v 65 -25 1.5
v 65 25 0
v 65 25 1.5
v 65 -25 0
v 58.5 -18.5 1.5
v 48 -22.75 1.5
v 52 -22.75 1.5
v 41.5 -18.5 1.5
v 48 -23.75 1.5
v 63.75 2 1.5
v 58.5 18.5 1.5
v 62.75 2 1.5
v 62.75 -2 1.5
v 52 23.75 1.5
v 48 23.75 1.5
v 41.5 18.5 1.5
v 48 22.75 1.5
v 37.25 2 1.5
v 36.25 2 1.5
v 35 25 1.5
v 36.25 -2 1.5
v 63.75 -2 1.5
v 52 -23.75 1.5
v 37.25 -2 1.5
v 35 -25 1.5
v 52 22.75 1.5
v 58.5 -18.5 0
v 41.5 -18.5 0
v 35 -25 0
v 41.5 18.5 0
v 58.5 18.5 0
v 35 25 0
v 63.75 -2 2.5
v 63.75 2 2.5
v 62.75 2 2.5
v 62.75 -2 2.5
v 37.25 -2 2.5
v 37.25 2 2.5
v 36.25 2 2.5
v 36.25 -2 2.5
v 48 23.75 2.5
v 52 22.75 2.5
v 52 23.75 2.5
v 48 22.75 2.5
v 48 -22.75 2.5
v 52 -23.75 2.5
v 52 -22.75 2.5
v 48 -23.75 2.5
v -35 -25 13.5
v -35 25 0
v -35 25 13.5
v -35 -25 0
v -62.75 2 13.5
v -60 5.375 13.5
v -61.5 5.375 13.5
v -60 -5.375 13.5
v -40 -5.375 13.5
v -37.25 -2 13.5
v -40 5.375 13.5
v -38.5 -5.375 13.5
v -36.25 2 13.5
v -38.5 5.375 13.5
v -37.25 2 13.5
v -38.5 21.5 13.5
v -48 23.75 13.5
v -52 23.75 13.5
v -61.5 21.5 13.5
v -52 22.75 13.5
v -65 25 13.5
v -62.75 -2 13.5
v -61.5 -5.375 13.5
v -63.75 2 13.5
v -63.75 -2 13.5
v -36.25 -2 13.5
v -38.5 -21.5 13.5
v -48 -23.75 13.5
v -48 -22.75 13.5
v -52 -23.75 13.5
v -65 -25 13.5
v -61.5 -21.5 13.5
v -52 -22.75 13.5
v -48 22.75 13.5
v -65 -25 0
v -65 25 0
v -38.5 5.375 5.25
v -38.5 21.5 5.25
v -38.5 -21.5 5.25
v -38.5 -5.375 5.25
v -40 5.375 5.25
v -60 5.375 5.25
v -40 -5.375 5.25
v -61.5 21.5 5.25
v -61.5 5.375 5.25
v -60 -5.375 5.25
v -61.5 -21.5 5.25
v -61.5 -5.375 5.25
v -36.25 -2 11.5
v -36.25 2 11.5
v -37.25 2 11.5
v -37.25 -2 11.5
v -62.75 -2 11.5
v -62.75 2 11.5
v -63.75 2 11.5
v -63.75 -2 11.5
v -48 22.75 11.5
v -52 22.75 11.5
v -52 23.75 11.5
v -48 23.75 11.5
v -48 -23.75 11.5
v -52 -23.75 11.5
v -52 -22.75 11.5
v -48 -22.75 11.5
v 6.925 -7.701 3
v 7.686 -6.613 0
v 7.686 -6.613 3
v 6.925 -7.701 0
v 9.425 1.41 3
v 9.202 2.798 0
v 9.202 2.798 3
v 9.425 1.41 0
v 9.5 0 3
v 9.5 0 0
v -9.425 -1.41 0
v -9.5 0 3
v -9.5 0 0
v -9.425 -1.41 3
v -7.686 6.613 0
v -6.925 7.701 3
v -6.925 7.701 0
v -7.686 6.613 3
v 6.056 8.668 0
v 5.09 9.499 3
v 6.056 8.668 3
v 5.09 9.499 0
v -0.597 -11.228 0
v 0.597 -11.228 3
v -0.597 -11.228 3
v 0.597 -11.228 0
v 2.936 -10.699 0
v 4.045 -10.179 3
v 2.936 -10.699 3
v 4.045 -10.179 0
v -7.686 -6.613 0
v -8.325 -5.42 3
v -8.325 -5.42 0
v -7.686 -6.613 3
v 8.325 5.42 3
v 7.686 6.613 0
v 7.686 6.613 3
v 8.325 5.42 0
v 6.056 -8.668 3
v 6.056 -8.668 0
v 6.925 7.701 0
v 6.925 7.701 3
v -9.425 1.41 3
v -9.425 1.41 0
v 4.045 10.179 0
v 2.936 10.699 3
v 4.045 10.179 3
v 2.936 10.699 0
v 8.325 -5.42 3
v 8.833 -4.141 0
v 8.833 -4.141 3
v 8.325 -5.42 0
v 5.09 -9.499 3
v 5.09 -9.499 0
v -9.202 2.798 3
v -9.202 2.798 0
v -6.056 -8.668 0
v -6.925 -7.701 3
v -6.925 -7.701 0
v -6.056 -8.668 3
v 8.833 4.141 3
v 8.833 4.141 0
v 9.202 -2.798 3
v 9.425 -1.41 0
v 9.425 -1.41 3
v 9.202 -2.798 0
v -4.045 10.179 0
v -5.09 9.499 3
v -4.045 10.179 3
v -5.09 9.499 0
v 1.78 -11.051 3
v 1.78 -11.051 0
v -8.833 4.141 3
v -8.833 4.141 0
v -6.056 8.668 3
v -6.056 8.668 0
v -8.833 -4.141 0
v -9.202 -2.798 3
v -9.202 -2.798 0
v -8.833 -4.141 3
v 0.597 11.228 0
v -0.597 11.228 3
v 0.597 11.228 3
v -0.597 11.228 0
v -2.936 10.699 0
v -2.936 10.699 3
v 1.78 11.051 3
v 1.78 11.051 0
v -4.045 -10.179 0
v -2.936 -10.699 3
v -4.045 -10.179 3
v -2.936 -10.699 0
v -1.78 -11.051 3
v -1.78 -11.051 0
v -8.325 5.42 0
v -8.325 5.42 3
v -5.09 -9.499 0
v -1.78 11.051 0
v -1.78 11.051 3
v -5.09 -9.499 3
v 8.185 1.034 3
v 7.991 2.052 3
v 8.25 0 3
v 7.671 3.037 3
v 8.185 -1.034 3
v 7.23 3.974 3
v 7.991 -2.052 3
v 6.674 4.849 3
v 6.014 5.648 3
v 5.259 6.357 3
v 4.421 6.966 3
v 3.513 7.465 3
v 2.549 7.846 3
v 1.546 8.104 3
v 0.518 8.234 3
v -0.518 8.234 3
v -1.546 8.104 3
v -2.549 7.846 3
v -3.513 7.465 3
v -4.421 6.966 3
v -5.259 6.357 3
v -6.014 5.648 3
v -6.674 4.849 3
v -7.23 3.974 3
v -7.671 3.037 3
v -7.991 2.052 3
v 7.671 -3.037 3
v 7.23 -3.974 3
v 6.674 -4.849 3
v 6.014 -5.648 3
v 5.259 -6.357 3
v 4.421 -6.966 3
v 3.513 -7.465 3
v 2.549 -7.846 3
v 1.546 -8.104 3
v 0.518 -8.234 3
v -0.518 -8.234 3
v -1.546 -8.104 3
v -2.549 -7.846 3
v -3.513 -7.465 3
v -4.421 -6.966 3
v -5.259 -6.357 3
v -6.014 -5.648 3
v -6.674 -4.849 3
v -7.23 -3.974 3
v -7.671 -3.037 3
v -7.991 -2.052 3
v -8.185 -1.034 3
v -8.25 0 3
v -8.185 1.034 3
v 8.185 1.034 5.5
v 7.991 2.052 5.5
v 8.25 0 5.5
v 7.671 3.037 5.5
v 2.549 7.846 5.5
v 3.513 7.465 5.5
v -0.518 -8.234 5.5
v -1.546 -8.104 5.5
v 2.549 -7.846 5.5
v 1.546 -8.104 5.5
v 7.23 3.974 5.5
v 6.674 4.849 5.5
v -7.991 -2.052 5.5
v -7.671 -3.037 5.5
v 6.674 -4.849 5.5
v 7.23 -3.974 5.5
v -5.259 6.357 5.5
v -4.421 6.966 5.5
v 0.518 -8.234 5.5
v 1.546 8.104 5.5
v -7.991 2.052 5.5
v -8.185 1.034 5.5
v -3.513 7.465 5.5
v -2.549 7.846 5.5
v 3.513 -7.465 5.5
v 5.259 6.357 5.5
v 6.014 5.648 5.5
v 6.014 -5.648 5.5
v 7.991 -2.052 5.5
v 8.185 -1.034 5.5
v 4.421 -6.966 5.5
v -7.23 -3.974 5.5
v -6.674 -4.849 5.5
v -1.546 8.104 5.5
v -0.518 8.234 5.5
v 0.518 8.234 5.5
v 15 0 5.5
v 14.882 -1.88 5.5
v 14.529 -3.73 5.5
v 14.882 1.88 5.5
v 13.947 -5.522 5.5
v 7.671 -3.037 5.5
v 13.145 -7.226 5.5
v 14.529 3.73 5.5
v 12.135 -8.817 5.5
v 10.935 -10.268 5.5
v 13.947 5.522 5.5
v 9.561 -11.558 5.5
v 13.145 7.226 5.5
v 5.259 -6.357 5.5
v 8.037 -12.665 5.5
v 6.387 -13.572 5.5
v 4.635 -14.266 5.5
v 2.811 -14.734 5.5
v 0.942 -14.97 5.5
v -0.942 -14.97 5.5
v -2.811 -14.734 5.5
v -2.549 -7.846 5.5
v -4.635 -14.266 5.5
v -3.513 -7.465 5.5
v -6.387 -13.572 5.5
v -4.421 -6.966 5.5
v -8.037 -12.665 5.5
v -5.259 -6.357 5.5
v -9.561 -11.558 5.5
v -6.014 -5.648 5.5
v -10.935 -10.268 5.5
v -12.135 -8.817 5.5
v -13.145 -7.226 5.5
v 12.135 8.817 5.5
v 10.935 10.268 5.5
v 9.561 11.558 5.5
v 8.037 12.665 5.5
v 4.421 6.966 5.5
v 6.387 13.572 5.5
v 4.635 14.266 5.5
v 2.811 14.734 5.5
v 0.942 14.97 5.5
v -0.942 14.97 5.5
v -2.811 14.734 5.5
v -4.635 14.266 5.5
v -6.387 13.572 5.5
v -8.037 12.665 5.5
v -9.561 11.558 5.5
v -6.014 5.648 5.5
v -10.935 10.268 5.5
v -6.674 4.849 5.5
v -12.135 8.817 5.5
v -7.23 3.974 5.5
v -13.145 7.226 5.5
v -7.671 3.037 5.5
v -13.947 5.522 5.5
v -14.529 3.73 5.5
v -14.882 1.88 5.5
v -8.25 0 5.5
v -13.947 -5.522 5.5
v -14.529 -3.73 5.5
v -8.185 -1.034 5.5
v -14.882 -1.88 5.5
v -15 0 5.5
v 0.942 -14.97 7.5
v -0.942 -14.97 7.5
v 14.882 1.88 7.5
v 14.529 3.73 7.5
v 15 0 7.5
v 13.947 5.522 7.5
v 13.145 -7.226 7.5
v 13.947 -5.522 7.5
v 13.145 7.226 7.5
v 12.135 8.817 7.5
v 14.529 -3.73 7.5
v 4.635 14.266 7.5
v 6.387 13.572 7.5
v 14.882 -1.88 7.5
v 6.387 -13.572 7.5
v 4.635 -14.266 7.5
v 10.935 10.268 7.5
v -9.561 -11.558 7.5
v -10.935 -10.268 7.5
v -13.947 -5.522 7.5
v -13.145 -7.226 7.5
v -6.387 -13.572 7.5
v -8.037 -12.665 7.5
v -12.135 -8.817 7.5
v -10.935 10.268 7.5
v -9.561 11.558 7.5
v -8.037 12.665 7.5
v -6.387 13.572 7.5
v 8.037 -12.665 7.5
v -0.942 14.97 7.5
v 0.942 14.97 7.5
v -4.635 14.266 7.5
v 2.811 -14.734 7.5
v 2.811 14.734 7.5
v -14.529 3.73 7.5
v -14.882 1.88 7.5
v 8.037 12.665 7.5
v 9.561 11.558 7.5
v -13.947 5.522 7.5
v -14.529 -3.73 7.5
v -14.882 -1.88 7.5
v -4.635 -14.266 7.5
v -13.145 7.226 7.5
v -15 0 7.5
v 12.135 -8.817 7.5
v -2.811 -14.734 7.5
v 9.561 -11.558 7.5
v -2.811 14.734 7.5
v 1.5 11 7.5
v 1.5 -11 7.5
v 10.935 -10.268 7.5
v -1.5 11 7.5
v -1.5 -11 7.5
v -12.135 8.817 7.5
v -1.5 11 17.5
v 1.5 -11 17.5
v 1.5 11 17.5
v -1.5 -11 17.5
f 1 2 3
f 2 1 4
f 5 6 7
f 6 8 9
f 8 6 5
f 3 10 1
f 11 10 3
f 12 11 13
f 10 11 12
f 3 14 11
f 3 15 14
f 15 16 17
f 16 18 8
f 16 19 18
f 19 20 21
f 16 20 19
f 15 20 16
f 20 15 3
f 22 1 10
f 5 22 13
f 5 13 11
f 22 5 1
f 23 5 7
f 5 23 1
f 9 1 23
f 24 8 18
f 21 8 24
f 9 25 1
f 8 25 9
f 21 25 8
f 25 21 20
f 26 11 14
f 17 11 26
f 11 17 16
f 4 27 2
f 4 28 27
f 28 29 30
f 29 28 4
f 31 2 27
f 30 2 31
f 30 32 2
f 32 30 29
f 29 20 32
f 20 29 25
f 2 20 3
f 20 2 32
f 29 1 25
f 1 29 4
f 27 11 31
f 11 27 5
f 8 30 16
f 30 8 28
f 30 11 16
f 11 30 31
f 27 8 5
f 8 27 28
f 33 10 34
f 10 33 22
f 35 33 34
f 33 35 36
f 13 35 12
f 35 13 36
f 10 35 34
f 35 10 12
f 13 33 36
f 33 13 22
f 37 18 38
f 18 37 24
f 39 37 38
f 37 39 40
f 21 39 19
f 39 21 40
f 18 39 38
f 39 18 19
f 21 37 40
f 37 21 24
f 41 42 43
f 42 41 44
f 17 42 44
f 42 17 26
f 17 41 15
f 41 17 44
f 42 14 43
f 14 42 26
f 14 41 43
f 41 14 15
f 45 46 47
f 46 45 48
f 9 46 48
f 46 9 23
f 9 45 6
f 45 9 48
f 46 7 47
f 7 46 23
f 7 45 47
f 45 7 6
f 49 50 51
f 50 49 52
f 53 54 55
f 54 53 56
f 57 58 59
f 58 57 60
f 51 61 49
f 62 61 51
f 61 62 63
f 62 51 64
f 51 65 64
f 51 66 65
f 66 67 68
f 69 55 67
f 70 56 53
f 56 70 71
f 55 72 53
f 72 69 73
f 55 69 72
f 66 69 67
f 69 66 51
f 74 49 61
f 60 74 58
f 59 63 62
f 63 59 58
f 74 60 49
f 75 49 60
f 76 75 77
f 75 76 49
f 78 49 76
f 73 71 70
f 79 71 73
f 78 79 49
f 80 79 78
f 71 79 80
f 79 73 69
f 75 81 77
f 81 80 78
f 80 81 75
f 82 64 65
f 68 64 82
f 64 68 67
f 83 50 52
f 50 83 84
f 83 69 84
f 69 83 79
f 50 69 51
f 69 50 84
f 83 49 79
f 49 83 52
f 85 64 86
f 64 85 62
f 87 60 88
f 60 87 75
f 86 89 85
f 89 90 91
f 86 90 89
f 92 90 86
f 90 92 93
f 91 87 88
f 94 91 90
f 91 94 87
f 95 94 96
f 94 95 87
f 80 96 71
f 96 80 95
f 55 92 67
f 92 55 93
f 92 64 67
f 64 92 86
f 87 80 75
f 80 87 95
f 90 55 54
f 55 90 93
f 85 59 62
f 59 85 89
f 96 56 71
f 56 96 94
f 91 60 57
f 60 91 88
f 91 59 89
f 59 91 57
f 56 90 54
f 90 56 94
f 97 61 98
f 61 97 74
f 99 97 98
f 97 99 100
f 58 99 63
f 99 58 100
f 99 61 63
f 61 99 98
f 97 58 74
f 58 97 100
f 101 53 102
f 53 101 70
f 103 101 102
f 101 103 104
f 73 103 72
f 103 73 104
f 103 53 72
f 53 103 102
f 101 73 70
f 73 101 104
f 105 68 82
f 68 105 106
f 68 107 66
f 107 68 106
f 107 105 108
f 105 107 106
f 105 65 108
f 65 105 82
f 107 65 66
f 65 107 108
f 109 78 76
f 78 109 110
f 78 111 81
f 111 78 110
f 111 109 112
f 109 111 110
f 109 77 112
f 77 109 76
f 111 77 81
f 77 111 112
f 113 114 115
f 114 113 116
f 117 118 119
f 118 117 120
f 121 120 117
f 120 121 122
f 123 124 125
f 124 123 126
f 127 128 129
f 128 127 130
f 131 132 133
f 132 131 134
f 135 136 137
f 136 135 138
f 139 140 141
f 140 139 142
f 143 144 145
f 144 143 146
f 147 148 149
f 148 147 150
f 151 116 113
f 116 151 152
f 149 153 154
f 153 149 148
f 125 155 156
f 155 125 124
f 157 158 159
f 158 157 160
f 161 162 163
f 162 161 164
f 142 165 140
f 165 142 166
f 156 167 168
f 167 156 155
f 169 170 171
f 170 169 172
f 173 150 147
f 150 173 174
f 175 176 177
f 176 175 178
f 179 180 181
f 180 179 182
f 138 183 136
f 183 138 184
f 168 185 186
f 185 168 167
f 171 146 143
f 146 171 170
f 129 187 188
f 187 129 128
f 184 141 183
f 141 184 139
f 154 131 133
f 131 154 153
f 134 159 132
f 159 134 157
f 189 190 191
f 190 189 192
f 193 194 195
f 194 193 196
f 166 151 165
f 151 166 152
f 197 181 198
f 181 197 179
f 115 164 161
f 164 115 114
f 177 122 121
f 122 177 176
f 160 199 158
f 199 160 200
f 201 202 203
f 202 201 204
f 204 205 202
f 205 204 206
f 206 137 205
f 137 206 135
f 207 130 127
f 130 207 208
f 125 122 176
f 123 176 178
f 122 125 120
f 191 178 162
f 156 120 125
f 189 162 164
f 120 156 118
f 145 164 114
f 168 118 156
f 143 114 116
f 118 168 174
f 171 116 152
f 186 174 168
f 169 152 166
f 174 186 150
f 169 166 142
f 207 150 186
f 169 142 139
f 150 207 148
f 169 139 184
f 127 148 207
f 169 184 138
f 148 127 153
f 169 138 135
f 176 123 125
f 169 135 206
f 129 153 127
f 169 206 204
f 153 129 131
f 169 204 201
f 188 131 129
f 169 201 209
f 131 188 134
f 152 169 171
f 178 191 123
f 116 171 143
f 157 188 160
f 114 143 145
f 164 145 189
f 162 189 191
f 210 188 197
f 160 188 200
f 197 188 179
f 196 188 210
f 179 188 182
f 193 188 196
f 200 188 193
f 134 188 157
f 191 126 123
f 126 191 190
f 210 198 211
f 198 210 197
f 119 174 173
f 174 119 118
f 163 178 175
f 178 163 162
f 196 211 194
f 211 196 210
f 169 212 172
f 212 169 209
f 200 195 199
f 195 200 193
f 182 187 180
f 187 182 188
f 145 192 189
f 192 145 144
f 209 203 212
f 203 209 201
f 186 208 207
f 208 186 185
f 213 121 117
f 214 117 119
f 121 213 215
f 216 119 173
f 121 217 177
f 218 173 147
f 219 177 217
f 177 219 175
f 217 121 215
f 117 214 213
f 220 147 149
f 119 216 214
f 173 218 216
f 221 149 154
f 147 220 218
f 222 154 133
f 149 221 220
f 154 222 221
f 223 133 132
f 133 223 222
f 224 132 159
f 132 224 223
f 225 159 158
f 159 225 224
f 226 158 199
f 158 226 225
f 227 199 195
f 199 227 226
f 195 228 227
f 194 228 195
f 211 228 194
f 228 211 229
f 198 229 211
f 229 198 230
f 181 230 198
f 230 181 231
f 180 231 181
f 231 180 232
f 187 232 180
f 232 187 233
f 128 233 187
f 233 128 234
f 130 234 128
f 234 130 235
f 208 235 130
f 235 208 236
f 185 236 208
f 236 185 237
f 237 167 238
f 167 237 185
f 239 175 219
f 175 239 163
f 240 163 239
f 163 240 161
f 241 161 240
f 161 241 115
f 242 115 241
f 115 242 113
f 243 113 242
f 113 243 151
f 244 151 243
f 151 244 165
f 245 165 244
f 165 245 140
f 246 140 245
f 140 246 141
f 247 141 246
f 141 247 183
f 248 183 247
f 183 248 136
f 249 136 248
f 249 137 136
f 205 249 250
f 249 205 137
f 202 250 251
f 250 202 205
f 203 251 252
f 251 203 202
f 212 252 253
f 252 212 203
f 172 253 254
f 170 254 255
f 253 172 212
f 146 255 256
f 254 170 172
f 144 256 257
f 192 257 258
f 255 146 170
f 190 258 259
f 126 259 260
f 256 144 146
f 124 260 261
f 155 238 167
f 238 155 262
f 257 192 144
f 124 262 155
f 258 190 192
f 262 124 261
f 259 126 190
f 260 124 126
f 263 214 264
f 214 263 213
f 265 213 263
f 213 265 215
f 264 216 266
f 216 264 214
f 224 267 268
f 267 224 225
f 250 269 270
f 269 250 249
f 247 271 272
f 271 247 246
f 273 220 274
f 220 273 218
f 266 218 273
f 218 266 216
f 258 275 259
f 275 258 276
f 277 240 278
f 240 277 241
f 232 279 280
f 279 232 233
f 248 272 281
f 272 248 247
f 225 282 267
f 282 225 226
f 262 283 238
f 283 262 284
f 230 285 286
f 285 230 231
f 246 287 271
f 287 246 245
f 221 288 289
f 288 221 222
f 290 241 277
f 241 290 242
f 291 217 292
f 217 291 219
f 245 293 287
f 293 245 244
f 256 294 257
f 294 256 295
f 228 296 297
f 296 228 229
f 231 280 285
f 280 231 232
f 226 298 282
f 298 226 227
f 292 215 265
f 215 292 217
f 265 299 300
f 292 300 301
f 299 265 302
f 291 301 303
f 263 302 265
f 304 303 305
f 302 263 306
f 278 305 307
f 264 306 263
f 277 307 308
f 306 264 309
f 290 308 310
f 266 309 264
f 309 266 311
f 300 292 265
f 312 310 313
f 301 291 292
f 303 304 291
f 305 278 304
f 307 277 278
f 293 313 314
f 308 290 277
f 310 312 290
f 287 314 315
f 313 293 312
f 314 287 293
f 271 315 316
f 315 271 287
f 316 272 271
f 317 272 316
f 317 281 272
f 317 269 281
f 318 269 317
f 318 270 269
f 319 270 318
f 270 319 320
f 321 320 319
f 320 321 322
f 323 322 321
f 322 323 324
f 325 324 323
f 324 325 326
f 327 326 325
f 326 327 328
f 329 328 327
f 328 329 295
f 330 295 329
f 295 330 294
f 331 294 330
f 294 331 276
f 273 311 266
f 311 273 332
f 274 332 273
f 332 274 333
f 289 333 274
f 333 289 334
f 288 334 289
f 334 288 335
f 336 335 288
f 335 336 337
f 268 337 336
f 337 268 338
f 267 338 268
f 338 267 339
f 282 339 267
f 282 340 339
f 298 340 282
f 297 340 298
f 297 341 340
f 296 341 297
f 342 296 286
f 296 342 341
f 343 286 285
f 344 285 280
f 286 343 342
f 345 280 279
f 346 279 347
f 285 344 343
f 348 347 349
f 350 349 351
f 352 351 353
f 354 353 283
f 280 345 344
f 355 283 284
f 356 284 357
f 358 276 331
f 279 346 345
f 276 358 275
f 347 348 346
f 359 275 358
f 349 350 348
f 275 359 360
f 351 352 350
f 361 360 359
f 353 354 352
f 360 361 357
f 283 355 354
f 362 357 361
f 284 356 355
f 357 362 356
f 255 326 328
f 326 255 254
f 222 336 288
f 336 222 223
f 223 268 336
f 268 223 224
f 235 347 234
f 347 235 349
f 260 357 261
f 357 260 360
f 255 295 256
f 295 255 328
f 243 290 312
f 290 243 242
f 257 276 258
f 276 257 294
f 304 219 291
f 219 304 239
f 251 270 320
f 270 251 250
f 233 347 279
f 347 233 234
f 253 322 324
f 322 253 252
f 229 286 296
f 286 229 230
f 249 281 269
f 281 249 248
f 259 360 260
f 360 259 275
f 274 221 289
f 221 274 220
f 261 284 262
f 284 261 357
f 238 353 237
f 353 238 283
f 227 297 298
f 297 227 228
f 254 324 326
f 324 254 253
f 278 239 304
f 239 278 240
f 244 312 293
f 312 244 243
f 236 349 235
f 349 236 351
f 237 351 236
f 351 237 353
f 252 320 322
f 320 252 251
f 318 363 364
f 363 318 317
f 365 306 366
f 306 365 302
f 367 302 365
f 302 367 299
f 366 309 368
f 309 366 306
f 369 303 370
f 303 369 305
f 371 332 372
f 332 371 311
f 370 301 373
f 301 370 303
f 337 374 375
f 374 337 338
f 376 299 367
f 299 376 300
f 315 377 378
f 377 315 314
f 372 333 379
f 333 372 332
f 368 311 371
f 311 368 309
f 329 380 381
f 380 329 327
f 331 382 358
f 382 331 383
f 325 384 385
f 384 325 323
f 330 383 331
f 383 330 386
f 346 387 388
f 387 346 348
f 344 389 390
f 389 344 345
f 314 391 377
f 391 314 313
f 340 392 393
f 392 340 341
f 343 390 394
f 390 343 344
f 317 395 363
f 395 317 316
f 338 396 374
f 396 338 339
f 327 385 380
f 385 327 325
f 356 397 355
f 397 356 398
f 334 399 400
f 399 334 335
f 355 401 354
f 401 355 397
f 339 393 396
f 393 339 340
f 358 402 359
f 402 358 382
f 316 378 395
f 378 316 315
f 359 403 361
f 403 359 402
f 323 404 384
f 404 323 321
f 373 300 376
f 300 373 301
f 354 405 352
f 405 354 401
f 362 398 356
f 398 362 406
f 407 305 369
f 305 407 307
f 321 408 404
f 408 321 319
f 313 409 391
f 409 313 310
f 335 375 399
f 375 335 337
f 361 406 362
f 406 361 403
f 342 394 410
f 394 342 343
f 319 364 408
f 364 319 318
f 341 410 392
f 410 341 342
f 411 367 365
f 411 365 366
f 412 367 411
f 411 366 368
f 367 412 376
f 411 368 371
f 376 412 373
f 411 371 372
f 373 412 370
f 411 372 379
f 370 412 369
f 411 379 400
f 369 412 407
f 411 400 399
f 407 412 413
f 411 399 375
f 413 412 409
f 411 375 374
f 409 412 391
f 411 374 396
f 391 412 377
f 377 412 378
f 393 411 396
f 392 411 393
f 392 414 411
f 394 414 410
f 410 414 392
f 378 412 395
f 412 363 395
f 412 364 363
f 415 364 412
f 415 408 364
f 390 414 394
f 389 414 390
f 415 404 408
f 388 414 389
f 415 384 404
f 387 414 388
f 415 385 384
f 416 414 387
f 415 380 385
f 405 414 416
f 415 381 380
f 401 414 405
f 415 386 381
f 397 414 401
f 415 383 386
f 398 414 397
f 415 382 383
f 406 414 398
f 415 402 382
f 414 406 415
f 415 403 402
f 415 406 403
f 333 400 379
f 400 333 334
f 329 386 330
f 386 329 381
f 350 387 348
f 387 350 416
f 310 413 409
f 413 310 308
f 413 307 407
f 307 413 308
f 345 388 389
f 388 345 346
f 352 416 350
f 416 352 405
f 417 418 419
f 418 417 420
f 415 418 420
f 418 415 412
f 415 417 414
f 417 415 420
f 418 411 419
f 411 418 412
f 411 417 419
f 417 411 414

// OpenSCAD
$fn = 50;// number of fragments

//general specifications
signal_width = 30;
signal_depth = 50;
signal_height = 15;

//cover specifications
cover_height = 1.5;
frame_width = 6.5; //thicker, to have the pins on all 4 sides, also needed for magnets later on
frame_overhang = 3;

//control specifications
move_tolerance = 0.5;
bottom_h = 3;
groove_h = cover_height+1; //higher, because the print support remains a bit
top_h = 2;

//body specification
body_height = signal_height-cover_height;
wall_thickness = frame_width-frame_overhang; //if the wall has to be thicker, the frame has to become thicker too
cavity_width = signal_width-2*wall_thickness;
cavity_depth = signal_depth-2*wall_thickness;
cavity_height = body_height-wall_thickness;

//connecting pins specification
pin_width = 1;
pin_depth = 4;
pin_height = 2;
hole_tolerance = 0.2;

pin_x = (signal_width-wall_thickness)/2; //wall_thicknes has to be >= 3.5mm
pin_y = (signal_depth-wall_thickness)/2;
pin_z = (cover_height/2);
pin_hole_z = (body_height-pin_height)/2;

module pin(hole = false){
    if (hole==false){
        cube([pin_width, pin_depth, pin_height], center = true);
    };
    if (hole==true){
        cube([pin_width+hole_tolerance, pin_depth+hole_tolerance, pin_height+hole_tolerance],center = true);
    };
};



//cover
module cover(){
    union(){
        difference(){
            cube([signal_width, signal_depth, cover_height], center = true);
            cube([signal_width-2*frame_width, signal_depth-2*frame_width, cover_height], center = true);
        };
        translate([pin_x,0,pin_z]) pin();
        translate([-pin_x,0,pin_z]) pin();
        translate([0,pin_y,pin_z]) rotate([0,0,90]) pin(hole = false);
        translate([0,-pin_y,pin_z]) rotate([0,0,90]) pin(hole = false);
    };
    
};
//body
module body(){
    difference(){
        union(){
            difference(){
                cube([signal_width, signal_depth, body_height], center=true);
                translate([0,0,wall_thickness]) cube([cavity_width, cavity_depth, cavity_height], center    =true);
            };
            //barrier
            difference(){
                cube([signal_width, cavity_depth/4, body_height], center=true);
                cube([cavity_width-2*(frame_overhang-(1+move_tolerance)), cavity_depth/3, body_height],     center=true);
            }; //"frame_overhang-1" creates a groove of 1mm in the middle part
        };
        translate([pin_x,0,pin_hole_z]) pin(hole = false);
        translate([-pin_x,0,pin_hole_z]) pin(hole = false);
        translate([0,pin_y,pin_hole_z]) rotate([0,0,90]) pin(hole = false);
        translate([0,-pin_y,pin_hole_z]) rotate([0,0,90]) pin(hole = false);
    };
};
//control
module control(){
    //bottom
    scaling_factor_x = (cavity_width-2*(frame_overhang-1))/(cavity_width-move_tolerance);
    scale([scaling_factor_x,1,1]) cylinder(h=bottom_h, d=cavity_width-move_tolerance);
    //cylinder(h=bottom_h, d=signal_width-(2*frame_width)+1);
    //groove
    translate([0,0,bottom_h]) cylinder(h=groove_h, d=signal_width-(2*frame_width+move_tolerance));
    //top
    translate([0,0,bottom_h+groove_h]) cylinder(h=top_h, d=signal_width);
    translate([0,0,bottom_h+groove_h+top_h+5]) rotate([0,0,90]) cube([signal_width-8, 3, 10], center=true);
};

//display objects
translate([50, 0, cover_height/2]) cover();
translate([-50, 0, body_height/2]) body();
translate([0,0,0]) rotate([0,0,0]) control(); //translate Z=bottom_h+groove_h+top_h



    
